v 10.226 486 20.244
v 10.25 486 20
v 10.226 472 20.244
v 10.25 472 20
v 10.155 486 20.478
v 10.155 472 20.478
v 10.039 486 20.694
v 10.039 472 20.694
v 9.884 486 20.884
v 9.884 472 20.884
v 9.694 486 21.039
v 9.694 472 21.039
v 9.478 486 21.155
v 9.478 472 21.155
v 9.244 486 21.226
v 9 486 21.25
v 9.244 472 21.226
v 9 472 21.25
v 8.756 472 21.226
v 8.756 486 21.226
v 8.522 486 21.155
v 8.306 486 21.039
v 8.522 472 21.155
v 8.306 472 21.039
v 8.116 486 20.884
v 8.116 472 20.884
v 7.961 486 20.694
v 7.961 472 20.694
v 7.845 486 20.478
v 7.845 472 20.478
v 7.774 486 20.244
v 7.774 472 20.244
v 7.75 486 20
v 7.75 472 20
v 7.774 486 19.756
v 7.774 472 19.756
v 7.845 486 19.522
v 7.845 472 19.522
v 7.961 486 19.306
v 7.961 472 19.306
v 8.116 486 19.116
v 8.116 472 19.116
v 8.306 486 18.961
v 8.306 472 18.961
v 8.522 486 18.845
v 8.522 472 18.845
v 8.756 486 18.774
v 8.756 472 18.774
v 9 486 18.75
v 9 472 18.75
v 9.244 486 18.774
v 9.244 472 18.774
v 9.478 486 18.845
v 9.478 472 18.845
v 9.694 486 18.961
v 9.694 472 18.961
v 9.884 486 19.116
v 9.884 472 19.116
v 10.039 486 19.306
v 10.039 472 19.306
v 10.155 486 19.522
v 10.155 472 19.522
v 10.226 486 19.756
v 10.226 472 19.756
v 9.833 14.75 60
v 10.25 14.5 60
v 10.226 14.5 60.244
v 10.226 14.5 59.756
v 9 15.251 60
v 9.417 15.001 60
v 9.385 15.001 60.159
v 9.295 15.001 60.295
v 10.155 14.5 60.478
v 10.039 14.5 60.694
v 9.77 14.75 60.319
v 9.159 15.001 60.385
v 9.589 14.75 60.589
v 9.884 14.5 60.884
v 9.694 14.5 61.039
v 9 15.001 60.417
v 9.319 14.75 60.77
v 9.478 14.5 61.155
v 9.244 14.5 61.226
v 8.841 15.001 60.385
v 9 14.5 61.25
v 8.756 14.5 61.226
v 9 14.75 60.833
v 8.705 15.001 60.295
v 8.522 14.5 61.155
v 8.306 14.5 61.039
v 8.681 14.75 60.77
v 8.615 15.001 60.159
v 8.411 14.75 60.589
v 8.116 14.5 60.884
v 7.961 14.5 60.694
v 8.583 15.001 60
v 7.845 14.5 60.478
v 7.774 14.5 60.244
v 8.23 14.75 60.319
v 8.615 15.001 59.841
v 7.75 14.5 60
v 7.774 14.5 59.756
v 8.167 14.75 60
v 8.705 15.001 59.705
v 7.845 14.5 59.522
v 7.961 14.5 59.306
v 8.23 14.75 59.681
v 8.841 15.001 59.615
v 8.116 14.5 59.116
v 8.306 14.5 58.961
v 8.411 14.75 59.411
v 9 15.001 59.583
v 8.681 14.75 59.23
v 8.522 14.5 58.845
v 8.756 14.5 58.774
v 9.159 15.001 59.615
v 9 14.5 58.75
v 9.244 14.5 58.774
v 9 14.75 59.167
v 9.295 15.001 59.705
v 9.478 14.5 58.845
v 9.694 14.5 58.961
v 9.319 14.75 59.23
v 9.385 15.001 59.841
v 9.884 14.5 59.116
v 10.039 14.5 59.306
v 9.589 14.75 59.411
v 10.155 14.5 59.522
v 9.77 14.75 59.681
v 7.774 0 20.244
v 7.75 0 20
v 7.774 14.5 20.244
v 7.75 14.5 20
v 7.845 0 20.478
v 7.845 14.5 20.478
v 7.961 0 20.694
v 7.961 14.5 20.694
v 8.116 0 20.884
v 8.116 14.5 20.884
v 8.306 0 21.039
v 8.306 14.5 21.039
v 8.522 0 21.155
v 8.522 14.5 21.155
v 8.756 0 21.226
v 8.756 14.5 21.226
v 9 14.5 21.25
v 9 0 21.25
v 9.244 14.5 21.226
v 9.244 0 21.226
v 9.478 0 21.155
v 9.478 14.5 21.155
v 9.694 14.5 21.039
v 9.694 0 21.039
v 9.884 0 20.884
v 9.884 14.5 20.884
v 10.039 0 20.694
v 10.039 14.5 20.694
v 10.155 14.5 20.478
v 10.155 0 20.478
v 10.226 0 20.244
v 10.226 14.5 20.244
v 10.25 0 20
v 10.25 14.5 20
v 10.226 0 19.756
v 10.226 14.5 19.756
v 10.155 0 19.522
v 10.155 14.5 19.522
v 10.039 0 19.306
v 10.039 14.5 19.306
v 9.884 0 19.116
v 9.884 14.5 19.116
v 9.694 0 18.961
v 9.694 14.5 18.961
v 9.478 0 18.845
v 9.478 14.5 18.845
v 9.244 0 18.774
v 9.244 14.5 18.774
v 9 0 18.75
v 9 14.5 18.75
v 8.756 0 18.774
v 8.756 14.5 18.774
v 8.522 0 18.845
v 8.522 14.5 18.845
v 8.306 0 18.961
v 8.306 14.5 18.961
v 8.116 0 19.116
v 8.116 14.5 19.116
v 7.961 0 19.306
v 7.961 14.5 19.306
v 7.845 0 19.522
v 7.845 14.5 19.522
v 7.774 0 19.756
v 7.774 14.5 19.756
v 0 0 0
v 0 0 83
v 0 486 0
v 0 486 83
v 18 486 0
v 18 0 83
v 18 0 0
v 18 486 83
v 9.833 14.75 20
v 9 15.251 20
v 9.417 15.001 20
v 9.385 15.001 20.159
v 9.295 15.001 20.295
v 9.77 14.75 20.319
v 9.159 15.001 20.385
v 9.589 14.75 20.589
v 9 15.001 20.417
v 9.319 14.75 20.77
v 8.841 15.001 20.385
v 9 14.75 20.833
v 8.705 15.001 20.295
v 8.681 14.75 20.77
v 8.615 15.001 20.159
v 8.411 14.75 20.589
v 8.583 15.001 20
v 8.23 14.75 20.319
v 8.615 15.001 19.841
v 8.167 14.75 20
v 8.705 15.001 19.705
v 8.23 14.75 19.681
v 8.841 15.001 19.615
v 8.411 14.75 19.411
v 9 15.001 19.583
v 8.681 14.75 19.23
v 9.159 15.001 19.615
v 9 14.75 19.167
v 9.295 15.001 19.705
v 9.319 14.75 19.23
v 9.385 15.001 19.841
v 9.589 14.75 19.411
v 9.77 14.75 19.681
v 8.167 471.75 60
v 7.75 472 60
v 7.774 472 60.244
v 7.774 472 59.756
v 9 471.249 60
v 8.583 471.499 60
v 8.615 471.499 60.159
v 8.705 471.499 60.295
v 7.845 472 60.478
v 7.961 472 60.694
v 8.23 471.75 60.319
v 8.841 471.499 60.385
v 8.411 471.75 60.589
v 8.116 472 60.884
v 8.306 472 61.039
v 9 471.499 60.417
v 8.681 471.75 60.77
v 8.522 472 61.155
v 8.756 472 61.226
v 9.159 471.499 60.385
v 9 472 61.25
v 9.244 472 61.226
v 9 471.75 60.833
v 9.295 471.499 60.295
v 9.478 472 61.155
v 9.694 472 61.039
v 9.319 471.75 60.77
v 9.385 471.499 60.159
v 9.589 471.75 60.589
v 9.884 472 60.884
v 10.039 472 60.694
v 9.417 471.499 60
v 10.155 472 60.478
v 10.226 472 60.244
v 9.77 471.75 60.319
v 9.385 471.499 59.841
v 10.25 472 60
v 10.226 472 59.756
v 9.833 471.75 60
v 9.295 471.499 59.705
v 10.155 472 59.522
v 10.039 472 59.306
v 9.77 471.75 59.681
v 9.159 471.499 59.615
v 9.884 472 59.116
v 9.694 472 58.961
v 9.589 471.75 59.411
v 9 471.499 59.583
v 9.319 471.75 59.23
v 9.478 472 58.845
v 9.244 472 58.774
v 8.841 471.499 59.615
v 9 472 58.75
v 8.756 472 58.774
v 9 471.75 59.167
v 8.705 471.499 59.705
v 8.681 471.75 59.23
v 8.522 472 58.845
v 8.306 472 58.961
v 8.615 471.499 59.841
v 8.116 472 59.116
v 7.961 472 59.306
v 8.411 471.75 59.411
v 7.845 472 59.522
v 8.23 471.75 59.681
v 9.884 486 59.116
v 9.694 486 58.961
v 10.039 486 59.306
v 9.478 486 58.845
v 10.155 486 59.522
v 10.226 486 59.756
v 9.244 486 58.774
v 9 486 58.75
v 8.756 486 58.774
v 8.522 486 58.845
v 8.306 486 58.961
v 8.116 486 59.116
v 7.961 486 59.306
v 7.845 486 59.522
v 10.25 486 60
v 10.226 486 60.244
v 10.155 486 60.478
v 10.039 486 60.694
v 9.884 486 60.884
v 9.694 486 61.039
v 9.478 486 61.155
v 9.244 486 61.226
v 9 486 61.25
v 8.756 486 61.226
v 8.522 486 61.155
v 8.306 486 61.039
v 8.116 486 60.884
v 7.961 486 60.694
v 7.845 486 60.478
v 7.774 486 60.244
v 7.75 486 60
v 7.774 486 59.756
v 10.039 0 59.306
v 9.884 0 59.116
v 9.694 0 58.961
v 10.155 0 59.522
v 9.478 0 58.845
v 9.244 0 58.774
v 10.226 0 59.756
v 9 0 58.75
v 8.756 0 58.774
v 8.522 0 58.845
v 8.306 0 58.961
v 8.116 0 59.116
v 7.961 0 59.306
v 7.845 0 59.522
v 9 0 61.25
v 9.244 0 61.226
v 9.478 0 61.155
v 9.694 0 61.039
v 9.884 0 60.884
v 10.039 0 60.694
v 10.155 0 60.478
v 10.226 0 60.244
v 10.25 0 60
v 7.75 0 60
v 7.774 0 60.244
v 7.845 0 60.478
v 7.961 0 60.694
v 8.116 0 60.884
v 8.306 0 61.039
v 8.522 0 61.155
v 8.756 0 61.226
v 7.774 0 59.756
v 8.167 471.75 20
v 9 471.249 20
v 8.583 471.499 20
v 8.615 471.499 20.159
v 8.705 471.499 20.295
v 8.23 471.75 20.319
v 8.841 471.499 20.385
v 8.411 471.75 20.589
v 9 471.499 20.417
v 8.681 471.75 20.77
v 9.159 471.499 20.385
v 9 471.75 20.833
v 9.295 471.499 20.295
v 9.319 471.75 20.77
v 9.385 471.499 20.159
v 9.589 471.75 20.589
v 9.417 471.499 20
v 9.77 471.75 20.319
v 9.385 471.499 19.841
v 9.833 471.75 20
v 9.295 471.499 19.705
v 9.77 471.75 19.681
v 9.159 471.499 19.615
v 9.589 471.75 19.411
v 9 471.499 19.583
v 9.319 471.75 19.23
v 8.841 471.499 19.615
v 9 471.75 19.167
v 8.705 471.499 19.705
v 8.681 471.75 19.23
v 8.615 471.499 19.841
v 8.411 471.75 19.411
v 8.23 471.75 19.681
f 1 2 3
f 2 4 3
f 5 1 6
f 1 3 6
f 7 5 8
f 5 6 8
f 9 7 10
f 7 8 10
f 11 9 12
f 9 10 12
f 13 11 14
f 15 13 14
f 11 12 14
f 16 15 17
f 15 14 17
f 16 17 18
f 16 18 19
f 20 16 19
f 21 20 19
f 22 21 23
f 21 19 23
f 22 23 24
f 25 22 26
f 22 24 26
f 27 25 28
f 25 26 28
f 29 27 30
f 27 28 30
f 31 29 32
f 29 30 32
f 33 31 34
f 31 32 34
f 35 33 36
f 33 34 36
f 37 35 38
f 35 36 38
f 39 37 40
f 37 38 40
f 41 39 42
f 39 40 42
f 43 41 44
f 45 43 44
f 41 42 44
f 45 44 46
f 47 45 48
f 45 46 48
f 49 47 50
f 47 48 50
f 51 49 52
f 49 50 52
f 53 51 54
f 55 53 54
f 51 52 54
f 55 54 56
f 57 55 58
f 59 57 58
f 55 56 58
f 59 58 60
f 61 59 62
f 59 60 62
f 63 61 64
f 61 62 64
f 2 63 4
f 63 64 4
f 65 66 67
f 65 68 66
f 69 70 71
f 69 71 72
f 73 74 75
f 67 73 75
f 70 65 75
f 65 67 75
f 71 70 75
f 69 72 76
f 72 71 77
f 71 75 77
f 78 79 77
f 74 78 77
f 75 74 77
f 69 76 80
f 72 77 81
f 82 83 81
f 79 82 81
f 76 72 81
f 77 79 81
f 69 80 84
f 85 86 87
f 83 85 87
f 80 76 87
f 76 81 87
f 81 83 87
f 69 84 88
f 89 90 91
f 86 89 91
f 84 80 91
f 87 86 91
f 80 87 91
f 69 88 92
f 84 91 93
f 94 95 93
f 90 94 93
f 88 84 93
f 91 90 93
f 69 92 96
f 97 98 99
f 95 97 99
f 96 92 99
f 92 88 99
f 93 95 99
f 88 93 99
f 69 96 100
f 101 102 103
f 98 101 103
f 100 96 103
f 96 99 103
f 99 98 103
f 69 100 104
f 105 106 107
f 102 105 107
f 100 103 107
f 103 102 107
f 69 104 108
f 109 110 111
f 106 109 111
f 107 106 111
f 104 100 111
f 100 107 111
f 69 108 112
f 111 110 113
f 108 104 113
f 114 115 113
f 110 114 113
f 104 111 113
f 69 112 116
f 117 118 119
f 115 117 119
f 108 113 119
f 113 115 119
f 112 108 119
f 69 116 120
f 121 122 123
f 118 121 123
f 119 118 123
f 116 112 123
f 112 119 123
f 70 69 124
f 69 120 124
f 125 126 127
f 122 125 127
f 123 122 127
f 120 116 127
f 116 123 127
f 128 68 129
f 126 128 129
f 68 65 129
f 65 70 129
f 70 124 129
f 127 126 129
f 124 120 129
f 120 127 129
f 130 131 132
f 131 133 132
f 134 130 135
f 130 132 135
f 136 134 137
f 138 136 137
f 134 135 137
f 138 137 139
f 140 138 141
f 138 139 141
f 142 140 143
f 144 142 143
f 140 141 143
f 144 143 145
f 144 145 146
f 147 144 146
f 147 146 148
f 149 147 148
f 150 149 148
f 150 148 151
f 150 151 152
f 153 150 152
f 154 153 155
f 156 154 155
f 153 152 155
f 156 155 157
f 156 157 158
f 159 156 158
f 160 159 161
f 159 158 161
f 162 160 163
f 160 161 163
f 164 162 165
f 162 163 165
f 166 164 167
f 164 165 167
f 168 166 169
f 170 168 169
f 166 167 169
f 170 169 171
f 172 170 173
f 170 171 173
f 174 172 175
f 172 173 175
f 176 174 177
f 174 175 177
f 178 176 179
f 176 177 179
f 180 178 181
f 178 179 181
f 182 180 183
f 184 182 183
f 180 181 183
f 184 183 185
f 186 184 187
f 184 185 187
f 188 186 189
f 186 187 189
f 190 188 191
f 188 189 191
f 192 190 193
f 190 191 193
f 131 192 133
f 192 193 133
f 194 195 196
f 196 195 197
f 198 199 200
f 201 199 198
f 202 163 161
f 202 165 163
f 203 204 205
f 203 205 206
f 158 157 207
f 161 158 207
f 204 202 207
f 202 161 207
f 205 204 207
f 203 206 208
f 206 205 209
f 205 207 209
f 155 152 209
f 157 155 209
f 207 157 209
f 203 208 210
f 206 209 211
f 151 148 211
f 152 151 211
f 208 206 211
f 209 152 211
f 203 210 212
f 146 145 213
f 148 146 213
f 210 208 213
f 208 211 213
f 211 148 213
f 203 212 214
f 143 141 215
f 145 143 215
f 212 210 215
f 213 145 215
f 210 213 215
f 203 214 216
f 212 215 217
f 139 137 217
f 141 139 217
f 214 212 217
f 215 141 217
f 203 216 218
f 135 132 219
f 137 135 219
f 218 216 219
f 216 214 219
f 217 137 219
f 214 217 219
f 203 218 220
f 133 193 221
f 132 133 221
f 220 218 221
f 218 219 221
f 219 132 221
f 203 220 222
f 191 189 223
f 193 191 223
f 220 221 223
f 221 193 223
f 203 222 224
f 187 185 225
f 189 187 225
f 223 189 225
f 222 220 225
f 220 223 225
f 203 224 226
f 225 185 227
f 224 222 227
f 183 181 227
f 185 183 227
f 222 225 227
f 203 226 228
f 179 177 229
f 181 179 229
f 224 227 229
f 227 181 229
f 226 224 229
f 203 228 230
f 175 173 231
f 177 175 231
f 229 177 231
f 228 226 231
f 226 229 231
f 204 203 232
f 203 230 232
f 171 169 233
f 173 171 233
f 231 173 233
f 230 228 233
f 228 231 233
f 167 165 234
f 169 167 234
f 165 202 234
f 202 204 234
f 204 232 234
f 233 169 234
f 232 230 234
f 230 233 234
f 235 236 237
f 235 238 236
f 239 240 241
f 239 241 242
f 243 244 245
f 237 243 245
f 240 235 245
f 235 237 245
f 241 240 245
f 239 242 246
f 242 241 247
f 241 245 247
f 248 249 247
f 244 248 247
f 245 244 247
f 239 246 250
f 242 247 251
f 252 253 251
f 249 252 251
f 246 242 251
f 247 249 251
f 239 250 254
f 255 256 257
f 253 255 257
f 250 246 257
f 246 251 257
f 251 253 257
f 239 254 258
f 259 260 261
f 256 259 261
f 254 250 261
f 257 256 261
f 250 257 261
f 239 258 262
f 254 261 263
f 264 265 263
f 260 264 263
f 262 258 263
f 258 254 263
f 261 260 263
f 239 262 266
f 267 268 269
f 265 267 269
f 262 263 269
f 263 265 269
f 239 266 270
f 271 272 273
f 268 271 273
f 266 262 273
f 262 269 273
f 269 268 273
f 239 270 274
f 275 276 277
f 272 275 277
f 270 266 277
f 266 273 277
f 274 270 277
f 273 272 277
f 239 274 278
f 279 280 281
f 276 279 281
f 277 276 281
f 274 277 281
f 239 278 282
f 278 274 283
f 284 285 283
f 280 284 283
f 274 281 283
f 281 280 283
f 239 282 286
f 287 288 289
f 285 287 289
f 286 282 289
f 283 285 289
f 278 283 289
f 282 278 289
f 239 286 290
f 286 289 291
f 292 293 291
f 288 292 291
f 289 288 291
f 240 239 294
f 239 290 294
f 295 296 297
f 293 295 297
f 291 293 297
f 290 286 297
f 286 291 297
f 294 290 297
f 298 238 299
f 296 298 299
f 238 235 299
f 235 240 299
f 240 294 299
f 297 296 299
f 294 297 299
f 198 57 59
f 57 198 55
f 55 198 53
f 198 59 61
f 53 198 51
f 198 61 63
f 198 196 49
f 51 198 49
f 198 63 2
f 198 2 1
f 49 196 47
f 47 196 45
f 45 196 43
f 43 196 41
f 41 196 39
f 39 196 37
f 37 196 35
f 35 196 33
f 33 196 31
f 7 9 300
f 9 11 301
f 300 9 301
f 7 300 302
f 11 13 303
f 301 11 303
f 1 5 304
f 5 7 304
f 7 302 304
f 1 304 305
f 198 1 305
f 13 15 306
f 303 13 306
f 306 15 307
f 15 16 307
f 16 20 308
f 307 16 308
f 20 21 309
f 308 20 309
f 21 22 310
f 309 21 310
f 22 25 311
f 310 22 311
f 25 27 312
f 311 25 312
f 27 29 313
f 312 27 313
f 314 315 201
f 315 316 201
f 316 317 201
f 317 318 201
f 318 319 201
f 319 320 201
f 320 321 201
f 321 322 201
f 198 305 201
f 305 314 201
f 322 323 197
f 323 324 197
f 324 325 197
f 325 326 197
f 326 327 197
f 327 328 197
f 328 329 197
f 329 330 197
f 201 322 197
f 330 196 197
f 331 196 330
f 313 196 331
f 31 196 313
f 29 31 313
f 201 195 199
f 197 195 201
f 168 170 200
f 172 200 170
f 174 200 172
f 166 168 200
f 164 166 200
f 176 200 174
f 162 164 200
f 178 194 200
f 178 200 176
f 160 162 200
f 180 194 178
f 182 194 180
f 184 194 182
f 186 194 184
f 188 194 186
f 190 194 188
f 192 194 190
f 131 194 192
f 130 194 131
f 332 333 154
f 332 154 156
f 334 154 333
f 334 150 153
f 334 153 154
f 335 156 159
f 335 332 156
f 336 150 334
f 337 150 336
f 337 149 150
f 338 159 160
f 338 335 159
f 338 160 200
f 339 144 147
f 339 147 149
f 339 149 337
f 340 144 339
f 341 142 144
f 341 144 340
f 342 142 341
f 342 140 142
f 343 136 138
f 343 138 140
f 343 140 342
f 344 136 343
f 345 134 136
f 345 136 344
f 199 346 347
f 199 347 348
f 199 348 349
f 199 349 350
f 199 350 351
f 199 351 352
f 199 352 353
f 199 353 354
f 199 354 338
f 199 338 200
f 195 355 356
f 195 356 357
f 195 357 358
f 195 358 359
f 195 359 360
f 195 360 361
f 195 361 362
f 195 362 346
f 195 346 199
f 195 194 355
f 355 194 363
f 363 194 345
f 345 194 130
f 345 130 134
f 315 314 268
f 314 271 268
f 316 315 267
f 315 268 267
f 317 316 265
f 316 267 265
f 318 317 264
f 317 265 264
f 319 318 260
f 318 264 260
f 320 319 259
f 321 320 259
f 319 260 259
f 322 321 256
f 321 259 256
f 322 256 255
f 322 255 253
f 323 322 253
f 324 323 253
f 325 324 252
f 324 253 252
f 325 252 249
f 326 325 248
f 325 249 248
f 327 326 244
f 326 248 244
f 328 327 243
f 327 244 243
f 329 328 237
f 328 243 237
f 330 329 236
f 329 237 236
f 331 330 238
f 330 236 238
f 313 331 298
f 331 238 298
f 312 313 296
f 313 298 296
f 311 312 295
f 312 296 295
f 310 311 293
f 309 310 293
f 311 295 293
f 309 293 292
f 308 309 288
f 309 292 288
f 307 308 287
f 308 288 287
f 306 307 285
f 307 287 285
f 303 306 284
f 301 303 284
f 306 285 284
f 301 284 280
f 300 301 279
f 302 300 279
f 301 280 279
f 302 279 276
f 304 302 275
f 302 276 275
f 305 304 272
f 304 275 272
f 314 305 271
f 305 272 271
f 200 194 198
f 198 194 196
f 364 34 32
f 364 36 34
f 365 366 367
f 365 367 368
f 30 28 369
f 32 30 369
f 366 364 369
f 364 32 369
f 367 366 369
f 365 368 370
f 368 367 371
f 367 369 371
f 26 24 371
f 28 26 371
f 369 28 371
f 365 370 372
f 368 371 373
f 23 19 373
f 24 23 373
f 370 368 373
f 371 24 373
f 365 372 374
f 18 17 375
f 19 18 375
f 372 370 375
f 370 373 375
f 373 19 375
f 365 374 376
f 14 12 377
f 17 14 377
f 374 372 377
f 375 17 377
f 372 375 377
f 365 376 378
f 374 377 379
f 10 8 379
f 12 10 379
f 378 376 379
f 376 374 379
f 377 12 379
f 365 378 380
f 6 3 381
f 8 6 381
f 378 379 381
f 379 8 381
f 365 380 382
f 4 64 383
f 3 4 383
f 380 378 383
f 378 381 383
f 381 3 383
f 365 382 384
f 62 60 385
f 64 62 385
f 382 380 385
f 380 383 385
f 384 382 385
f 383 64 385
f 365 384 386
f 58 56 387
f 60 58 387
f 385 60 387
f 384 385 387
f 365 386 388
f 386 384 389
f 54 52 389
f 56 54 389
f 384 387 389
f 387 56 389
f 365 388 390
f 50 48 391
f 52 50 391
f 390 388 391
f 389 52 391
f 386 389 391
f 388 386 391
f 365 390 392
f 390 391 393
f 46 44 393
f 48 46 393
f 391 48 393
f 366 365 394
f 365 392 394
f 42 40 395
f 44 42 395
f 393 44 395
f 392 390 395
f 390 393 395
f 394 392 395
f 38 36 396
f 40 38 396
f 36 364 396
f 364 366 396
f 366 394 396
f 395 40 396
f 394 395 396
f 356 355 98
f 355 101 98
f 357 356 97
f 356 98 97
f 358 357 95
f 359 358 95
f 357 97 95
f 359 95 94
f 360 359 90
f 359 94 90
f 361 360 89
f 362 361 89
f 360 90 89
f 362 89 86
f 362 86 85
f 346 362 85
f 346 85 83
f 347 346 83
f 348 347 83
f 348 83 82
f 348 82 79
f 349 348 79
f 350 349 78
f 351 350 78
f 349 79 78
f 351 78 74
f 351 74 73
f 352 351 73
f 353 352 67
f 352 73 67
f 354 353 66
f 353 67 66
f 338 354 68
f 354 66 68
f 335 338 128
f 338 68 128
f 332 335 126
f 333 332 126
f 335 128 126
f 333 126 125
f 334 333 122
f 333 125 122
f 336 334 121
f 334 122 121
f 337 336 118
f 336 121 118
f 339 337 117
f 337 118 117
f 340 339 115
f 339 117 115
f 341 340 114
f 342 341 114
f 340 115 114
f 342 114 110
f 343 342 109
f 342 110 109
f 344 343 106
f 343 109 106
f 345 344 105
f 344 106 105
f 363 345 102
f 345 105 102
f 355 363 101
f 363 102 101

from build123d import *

# Parameters (mm, degrees)
F0_W     = 486
F0_H     = 83
F1_DEPTH = 18
F3_D     = 2.5
F3_DEPTH = 14.5
F3_TIP   = 0.7510757738
F5_D     = 2.5
F5_DEPTH = 14
F5_TIP   = 0.7510757738


with BuildPart() as f1:
    # F0 (on Right) → F1 (new body)
    with BuildSketch(Plane.YZ):
        with Locations((243, 41.5)):
            Rectangle(F0_W, F0_H)
    extrude(amount=F1_DEPTH)

    # F3
    with Locations(Plane.XZ):
        with Locations((9, 20), (9, 60)):
            Hole(F3_D / 2, depth=F3_DEPTH)
            with Locations((0, 0, -(F3_DEPTH + F3_TIP / 2))):  # 118° drill point
                Cone(0, F3_D / 2, F3_TIP, mode=Mode.SUBTRACT)

    # F5
    with Locations(Plane(origin=(0, 486, 0), x_dir=(-1, 0, 0), z_dir=(0, 1, 0))):
        with Locations((-9, 60), (-9, 20)):
            Hole(F5_D / 2, depth=F5_DEPTH)
            with Locations((0, 0, -(F5_DEPTH + F5_TIP / 2))):  # 118° drill point
                Cone(0, F5_D / 2, F5_TIP, mode=Mode.SUBTRACT)


solid = f1.part
